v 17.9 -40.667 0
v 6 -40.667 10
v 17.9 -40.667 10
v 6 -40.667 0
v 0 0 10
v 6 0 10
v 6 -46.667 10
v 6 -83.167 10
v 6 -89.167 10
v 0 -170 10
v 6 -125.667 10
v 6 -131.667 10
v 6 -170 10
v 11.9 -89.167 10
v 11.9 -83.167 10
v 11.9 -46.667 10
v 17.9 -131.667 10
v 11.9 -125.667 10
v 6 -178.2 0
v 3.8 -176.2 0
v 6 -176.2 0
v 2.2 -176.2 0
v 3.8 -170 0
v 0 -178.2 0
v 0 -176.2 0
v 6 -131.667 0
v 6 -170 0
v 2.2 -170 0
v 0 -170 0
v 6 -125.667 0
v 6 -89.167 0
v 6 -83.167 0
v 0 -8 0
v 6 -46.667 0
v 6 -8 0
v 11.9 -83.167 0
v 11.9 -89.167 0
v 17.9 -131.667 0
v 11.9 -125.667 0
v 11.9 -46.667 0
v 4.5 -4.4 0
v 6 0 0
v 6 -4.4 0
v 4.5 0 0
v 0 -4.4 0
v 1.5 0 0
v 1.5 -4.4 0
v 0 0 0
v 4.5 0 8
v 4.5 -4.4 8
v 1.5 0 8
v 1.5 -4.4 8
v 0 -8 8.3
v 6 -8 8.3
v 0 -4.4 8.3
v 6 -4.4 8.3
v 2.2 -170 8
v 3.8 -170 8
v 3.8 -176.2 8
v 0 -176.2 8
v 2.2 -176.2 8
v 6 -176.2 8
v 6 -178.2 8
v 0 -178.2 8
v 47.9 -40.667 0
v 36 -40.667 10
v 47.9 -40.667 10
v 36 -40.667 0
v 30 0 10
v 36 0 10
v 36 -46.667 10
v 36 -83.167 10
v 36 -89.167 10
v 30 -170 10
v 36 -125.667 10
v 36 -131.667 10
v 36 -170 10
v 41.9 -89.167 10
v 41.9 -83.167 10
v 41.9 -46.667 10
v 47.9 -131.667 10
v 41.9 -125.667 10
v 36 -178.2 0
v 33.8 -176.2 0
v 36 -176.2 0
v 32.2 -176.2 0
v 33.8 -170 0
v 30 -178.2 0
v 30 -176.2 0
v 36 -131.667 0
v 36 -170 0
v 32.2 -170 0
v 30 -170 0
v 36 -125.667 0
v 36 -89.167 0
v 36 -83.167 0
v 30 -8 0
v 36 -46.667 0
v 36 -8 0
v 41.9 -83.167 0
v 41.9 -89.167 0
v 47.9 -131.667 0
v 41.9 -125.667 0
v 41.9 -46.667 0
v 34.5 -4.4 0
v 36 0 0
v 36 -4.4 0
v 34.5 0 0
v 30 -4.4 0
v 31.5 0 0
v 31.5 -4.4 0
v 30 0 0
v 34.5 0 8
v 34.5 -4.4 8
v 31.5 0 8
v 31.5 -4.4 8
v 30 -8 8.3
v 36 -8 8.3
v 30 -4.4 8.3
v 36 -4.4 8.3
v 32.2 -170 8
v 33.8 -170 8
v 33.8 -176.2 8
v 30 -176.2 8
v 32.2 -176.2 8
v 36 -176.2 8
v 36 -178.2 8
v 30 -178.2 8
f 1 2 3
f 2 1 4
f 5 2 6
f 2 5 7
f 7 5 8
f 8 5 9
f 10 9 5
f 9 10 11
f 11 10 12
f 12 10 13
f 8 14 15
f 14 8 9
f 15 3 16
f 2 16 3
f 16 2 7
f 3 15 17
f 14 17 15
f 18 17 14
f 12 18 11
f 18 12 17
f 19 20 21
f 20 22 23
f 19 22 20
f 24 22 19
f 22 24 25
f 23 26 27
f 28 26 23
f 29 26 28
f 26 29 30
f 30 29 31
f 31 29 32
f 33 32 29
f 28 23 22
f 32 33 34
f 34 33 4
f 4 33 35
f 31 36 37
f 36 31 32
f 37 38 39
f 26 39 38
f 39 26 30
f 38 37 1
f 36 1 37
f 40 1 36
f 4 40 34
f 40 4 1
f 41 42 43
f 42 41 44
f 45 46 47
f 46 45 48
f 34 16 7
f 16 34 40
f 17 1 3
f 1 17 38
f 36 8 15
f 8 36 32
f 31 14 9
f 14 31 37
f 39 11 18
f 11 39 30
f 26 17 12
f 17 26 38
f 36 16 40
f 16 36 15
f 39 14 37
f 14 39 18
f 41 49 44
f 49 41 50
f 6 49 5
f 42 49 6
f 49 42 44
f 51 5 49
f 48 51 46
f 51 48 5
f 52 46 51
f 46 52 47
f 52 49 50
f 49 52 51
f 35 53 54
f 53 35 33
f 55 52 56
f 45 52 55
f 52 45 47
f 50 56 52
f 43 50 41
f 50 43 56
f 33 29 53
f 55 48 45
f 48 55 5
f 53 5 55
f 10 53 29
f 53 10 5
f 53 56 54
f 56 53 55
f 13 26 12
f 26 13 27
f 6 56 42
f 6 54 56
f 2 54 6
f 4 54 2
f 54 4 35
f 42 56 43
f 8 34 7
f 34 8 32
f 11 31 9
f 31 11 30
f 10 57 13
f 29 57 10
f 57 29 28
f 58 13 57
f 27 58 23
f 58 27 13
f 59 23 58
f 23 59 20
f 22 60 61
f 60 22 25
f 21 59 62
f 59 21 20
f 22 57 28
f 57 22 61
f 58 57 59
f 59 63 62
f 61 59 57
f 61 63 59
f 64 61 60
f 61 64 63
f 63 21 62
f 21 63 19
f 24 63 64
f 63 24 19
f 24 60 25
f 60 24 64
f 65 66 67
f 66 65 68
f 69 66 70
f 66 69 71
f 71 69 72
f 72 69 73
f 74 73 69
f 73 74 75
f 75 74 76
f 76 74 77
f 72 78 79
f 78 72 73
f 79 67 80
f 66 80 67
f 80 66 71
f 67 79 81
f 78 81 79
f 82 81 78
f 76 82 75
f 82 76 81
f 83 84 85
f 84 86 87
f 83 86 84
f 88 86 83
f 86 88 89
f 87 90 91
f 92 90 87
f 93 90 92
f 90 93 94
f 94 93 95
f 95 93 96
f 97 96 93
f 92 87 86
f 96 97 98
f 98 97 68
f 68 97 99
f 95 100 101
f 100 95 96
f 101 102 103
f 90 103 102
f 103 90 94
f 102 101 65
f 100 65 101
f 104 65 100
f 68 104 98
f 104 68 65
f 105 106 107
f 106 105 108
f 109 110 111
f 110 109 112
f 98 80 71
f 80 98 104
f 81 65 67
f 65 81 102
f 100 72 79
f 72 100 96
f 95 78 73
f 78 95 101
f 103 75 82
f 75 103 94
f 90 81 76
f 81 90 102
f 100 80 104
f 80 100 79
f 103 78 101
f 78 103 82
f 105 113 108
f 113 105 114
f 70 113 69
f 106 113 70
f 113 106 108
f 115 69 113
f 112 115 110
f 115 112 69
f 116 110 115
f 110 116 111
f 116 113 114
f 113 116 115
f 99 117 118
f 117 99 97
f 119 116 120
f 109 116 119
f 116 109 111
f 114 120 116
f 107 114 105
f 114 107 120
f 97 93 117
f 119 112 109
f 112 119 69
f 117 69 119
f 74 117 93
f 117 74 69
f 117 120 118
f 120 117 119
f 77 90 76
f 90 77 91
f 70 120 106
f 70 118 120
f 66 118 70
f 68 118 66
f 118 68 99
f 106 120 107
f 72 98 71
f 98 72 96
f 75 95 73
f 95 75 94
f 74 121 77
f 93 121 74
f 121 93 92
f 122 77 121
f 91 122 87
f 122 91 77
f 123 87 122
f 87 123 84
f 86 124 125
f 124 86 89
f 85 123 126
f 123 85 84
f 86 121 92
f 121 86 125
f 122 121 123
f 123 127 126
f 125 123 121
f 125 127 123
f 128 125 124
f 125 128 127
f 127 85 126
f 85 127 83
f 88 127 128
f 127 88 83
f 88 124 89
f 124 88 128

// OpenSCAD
// Generate just a narrow test profile to ensure it fits your monitor
test_profile = 0; // [0: Full width, 1: Test profile]

hook_height=170;  //Height of the hook - dropping it 40 mm below top 
thickness = 3.0;  // thickness
shelf_width = 10; // Width of the perch shelf (mm).
extra_hanger_perch = 1; // [0: No extra perches, 1: Add extra hanger perches for stability]
extra_perch_length = 12; //if adding extra perches, this is how large they will be in mm

module Rod() //rod module
{
    
    union() {
        if(extra_hanger_perch) {
        translate([thickness*2+extra_perch_length-0.1,0,hook_height/3-10])rotate([0,0,90]) union() {
          //cube([thickness*2, thickness*2, hook_height/2]);
          translate([0,0,0]) rotate([0,90,00]) cube([thickness*2, extra_perch_length, shelf_width ]);
          translate([0,0,hook_height/4]) rotate([0,90,00]) cube([thickness*2, extra_perch_length, shelf_width]);
          translate([0,0,hook_height/2]) rotate([0,90,00]) cube([thickness*2, extra_perch_length, shelf_width]);
            cube([shelf_width, thickness*2, hook_height/2]);
              }
          }
        difference() {
                    cube([thickness*2, shelf_width, hook_height]);
            //add back support rods - 12mm
      
                    femaleConnector();
                }
                 translate([0,0,hook_height]) {
                     maleConnector();
                 }
            }
}


module Perch() // Top level module
{
    rotate([90,0,0]) union() {
        translate([0,0,0]) {
            Rod();
        }
        translate([30,0,0]) {
            Rod(); 
        }
    }
}
module maleConnector() 
{
    translate([2.2,0,0]) cube([thickness*2-4.4, shelf_width-2, 6.2]); //-male rod
    translate([0,0,6.2]) cube([thickness*2, shelf_width-2, 2]); //-male - cross piece
}

module femaleConnector() 
{ //be sure to take this as the difference
    translate([1.5,0,0]) cube([thickness*2-3, shelf_width-2, 7.2]); //-female rod
    translate([0,0,4.4]) cube([thickness*2+2, shelf_width-1.7, 3.6]); //-female - cross piece
}

module Profile()
{
    intersection() {
        Perch();
        cube([1000,1000,2],center=true);
    }
}



if (test_profile == 1) {
    Profile();
} else {
    
    Perch();
}
